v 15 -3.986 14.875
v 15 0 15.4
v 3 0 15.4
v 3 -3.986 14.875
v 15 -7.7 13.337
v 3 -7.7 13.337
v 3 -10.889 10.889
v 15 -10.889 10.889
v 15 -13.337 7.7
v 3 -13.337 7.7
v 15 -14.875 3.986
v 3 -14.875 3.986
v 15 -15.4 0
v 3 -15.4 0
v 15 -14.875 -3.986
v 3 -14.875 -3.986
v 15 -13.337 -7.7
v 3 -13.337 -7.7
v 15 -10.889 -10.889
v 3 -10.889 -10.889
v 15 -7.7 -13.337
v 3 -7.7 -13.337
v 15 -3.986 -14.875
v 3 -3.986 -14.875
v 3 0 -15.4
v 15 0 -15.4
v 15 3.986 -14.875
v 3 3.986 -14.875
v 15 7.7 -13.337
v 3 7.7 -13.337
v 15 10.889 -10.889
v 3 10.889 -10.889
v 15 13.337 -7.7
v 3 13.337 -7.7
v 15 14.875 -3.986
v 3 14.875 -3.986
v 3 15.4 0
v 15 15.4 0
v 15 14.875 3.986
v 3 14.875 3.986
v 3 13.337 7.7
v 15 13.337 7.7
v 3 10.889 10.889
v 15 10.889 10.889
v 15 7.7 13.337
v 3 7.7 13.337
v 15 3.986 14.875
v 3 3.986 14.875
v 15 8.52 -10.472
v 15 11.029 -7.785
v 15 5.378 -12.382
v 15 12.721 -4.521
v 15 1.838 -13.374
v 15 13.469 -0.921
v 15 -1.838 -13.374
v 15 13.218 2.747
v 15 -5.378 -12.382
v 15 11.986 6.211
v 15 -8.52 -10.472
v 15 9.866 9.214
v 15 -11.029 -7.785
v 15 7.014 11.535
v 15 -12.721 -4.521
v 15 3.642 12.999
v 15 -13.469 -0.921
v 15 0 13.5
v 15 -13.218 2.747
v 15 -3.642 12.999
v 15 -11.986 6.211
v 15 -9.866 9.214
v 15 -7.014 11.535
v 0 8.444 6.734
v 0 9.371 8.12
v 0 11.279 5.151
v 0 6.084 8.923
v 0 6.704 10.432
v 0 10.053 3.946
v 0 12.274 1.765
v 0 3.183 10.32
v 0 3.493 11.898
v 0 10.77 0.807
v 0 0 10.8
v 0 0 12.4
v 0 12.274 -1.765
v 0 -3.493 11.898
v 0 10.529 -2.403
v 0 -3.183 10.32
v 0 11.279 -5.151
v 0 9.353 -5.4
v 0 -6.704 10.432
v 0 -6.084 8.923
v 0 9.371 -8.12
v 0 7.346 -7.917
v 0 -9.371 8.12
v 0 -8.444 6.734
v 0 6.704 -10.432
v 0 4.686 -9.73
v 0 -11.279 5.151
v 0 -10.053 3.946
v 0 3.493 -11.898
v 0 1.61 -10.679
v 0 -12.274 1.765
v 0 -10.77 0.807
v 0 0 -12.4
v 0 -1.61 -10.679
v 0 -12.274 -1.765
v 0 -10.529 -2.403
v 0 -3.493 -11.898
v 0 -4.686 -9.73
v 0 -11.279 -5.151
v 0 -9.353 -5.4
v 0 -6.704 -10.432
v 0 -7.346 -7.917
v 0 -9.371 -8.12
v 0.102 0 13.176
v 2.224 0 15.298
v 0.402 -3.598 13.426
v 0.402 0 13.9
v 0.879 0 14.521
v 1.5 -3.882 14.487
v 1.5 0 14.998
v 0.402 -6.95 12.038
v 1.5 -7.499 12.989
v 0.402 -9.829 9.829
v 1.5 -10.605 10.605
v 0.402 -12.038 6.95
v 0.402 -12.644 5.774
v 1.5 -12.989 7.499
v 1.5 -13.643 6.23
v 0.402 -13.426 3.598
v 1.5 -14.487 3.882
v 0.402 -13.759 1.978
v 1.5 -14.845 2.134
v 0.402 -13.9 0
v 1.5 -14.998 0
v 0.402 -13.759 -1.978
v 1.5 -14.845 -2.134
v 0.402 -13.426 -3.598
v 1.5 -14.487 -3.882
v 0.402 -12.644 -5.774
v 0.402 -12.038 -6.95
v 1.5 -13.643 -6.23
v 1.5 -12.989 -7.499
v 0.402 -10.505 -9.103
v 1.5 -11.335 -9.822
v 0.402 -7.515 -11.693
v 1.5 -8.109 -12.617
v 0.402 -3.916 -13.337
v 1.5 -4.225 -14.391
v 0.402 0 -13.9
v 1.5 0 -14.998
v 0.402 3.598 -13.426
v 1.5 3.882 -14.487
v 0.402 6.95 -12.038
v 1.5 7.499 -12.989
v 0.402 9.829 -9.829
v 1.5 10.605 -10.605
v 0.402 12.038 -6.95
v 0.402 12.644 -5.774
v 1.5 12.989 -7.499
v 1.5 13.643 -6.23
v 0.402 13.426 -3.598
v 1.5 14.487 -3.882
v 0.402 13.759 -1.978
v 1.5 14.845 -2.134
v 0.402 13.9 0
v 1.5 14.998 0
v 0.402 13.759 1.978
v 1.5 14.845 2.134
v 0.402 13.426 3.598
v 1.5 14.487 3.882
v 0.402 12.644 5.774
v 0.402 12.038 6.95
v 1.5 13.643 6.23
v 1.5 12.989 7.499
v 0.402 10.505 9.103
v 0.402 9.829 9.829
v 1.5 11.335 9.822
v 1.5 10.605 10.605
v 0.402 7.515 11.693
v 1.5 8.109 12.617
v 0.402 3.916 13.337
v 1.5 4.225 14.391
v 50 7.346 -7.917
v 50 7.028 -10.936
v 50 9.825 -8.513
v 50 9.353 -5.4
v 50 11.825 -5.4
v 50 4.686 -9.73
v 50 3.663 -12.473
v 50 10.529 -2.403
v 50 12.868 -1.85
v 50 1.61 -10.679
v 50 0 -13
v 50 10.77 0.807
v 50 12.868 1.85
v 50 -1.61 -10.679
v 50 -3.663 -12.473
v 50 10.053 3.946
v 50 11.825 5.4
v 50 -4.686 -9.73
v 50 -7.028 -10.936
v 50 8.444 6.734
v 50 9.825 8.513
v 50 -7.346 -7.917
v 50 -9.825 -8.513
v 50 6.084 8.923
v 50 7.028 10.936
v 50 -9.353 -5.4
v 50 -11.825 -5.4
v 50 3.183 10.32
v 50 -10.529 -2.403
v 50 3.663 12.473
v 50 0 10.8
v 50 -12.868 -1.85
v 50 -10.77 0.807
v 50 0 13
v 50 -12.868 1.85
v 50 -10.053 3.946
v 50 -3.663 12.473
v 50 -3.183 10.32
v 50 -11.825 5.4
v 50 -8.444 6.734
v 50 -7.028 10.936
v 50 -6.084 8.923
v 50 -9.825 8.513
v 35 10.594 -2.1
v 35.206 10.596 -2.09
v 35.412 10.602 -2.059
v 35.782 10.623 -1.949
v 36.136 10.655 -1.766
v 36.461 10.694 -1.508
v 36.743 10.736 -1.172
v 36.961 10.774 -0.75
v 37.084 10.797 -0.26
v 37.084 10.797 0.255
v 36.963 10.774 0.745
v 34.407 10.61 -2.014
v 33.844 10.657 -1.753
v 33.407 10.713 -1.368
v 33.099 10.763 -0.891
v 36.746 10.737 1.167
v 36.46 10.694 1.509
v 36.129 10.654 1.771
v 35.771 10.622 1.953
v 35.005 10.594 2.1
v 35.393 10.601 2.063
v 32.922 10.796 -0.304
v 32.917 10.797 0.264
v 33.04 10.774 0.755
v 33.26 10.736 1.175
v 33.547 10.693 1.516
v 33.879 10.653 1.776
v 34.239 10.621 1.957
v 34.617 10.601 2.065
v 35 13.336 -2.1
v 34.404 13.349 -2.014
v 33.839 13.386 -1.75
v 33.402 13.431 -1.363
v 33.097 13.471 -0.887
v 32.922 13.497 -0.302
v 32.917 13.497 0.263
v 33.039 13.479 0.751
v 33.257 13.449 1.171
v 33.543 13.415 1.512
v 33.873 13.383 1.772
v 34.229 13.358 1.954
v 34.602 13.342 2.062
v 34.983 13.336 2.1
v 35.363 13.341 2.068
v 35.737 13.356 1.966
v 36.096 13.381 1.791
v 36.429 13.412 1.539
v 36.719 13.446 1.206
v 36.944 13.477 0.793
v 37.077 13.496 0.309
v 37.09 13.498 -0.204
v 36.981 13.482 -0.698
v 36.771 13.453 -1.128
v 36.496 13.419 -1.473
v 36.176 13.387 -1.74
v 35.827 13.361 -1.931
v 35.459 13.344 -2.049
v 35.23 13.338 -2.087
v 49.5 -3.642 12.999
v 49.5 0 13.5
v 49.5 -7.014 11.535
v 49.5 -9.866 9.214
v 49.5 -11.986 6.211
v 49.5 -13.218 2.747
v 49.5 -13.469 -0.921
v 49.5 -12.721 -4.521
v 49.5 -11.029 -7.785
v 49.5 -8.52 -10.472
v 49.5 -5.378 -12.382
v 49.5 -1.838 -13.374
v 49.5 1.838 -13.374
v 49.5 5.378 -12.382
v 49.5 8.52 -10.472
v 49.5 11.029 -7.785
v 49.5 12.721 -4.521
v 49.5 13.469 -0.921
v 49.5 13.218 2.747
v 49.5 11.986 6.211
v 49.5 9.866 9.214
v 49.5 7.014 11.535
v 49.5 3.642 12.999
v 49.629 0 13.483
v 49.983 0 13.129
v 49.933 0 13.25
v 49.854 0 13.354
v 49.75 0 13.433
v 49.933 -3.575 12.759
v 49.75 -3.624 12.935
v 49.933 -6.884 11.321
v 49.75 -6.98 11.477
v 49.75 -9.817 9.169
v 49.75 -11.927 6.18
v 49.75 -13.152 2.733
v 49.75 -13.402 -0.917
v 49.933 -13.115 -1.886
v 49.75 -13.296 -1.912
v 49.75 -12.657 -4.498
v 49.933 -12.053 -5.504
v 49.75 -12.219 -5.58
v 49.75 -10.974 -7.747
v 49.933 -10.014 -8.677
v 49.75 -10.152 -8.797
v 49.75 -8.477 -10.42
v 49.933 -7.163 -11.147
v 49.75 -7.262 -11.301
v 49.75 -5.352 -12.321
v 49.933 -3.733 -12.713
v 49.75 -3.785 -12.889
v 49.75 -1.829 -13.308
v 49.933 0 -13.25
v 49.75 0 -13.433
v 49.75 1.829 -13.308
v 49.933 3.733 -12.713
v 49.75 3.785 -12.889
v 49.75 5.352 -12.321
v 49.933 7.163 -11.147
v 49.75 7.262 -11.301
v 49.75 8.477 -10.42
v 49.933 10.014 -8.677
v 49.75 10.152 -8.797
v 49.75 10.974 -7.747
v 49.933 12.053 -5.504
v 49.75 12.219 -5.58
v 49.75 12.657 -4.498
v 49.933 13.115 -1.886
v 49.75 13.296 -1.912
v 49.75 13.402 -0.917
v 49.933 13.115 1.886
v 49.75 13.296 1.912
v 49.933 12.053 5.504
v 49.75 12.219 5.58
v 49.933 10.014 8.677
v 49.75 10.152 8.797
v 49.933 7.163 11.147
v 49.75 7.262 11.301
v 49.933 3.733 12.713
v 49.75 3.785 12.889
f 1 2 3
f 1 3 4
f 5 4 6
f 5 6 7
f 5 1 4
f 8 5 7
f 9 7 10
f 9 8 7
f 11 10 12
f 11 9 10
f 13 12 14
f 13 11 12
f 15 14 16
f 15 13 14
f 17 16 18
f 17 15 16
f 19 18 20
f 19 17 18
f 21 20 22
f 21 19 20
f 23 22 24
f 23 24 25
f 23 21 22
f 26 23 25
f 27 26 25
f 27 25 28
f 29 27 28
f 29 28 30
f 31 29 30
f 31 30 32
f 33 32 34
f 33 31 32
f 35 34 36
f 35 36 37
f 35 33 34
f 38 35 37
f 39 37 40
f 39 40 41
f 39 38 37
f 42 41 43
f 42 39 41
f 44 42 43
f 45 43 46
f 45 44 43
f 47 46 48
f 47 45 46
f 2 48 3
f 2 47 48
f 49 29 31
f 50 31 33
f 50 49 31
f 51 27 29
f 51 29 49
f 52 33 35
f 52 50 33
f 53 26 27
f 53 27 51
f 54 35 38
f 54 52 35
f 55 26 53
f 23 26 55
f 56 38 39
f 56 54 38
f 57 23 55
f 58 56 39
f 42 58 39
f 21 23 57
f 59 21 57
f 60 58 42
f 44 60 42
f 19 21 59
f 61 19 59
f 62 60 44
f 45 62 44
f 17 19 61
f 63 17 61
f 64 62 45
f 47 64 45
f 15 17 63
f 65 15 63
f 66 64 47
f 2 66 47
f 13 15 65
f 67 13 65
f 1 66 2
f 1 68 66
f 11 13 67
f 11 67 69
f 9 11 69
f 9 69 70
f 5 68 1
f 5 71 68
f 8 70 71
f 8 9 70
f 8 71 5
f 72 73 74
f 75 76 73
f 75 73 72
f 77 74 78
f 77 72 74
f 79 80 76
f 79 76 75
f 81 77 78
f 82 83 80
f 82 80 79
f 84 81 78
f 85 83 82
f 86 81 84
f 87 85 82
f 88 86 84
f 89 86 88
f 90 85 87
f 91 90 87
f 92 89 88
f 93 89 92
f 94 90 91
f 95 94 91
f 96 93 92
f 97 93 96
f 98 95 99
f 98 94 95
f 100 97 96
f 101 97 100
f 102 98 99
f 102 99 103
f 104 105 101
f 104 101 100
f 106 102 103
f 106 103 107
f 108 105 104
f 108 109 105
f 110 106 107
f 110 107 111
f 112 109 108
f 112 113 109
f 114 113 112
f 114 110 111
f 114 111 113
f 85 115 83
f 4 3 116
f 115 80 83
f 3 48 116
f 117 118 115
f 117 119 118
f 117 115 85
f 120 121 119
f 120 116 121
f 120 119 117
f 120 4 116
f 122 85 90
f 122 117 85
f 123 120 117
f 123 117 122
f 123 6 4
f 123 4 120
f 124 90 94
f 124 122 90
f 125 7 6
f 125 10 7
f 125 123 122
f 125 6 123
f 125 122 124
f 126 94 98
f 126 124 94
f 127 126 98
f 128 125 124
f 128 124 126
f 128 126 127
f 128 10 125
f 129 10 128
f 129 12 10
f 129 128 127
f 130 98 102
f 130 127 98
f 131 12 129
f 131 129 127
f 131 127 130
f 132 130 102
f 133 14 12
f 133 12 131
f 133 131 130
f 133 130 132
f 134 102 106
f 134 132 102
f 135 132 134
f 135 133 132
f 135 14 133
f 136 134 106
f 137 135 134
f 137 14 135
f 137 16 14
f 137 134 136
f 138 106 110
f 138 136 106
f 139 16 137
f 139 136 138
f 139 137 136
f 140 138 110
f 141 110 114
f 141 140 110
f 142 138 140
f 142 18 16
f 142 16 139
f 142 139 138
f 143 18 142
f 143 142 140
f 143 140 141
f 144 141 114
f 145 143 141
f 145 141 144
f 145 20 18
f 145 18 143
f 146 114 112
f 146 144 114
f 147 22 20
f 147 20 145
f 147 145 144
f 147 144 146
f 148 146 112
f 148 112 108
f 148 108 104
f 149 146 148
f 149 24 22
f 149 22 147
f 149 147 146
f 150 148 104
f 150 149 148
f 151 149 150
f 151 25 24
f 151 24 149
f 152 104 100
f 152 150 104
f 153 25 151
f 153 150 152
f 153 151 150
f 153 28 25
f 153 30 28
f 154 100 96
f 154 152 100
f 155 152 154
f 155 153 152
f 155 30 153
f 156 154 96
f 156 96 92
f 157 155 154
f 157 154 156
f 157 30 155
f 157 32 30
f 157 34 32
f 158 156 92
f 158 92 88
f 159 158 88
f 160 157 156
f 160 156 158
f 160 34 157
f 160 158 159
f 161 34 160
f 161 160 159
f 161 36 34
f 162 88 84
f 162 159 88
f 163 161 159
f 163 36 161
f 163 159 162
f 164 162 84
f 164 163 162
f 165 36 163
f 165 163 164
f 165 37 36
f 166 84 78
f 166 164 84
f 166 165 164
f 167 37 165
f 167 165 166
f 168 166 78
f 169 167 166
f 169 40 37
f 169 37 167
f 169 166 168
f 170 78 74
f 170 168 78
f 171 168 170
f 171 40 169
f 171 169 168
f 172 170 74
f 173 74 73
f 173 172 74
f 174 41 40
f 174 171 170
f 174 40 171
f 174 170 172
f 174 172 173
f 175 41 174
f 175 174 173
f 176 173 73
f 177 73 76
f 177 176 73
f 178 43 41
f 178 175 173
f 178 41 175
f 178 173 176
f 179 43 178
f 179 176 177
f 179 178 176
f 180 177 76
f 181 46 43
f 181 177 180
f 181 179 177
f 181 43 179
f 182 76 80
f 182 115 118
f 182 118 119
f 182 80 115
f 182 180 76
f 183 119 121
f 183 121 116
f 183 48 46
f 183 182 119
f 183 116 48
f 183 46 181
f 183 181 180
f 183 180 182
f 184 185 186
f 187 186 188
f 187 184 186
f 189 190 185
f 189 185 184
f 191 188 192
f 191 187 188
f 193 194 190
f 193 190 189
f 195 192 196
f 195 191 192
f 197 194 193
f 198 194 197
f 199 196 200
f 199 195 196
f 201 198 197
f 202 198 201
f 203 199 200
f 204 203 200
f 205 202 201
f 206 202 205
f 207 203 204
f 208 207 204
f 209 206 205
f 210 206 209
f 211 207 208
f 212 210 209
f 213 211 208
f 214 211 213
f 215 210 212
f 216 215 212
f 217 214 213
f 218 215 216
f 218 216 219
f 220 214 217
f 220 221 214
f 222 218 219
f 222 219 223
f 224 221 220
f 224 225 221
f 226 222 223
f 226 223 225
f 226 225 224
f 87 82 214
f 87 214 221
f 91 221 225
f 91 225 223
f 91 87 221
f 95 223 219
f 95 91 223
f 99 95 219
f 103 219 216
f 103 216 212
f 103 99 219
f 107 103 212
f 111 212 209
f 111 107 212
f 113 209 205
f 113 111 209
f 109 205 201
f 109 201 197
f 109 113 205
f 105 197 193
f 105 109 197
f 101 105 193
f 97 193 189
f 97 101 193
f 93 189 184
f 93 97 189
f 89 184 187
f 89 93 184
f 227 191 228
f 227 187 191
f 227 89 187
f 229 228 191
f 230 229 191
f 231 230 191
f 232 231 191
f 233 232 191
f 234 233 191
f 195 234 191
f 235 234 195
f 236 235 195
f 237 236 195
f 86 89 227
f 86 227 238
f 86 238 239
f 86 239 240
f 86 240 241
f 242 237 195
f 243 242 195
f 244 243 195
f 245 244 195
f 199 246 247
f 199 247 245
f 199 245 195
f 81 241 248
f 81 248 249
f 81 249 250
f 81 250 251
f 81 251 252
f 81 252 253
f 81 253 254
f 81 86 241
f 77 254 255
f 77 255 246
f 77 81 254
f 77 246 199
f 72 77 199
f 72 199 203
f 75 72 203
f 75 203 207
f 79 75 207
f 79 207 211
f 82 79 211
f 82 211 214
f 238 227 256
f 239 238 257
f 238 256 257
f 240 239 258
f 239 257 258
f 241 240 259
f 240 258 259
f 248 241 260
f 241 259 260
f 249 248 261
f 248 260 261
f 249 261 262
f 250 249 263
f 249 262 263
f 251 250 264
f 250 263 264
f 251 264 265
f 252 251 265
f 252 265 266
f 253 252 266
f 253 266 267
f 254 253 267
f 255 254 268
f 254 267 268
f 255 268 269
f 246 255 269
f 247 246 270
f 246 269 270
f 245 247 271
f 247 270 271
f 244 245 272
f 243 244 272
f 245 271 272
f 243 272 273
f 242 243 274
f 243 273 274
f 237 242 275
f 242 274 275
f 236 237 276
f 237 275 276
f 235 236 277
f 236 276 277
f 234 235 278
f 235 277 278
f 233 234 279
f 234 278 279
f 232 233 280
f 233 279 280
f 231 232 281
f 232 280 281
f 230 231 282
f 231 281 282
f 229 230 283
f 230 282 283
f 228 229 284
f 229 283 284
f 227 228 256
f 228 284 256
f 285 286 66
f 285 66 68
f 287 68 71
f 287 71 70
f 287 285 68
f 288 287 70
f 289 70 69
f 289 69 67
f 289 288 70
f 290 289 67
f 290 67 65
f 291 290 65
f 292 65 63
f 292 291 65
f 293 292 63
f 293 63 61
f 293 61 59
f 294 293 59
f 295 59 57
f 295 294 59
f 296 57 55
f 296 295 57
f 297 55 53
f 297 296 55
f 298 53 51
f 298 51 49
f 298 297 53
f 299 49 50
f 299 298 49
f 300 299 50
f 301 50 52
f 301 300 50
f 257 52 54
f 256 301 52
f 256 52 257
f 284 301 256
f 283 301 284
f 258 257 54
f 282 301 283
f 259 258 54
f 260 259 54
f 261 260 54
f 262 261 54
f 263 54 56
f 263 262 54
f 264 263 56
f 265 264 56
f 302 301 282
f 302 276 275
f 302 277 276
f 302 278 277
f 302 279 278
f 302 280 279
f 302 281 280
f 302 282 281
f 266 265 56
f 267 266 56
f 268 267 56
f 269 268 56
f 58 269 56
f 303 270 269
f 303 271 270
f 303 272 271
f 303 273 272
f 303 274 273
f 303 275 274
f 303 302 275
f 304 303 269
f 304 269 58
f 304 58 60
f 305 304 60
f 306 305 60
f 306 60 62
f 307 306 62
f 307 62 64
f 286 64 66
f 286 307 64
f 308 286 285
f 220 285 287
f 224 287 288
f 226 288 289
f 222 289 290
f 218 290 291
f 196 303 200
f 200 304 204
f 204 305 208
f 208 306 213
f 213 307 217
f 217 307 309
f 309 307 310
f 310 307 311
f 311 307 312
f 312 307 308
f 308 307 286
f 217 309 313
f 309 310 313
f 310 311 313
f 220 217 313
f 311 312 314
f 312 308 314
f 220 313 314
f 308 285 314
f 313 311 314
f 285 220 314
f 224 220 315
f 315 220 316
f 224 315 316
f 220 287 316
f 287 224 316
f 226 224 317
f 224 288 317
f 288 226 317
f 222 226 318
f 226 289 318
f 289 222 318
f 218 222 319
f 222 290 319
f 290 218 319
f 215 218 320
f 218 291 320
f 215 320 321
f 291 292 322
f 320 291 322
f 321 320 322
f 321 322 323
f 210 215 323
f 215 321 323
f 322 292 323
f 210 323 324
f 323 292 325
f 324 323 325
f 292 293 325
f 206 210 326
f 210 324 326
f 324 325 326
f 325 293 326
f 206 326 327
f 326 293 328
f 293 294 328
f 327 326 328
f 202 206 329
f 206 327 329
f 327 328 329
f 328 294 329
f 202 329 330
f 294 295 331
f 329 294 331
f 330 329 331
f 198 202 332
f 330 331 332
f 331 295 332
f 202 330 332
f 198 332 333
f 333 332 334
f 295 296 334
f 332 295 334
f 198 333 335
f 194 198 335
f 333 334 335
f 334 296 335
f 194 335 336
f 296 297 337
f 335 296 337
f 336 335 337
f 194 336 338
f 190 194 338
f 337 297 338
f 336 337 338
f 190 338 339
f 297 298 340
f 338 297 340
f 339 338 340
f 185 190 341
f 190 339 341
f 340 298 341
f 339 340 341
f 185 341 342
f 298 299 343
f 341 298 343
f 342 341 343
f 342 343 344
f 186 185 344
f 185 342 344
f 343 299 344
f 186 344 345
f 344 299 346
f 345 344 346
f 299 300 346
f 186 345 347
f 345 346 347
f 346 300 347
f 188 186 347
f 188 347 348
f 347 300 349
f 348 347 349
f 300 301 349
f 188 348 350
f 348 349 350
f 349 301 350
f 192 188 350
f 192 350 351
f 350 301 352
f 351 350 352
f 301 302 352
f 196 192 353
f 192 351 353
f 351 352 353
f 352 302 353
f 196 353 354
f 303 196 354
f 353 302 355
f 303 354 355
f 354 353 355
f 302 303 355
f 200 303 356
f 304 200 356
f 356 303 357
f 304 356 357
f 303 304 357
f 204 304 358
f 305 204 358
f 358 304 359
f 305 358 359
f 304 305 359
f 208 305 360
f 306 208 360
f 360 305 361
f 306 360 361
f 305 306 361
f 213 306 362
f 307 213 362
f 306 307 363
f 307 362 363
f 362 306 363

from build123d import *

# Parameters (mm, degrees)
ESBO_O3_W = 2.1
ESBO_O3_H = 15.4
FILETE1_R = 3
FILETE2_R = 0.5


with BuildPart() as part:
    # Esboço1 → Revolução1 (revolve)
    with BuildSketch(Plane.XY, mode=Mode.PRIVATE) as revolu_o1_sk:
        Polygon((0, 10.8), (0, 15.4), (15, 15.4), (15, 13.5), (50, 13.5), (50, 10.8), align=None)
    revolve(revolu_o1_sk.sketch.rotate(Axis((0, 0, 0), (1, 0, 0)), 90), axis=Axis((0, 0, 0), (1, 0, 0)))

    # Esboço3 → Furo roscado de M51 (revolve, cut)
    with BuildSketch(Plane(origin=(35, 0, 0), x_dir=(0, 0, -1), z_dir=(1, 0, 0))):
        with Locations((1.05, 7.7)):
            Rectangle(ESBO_O3_W, ESBO_O3_H)
    revolve(axis=Axis((35, -6.35, 0), (0, 1, 0)), mode=Mode.SUBTRACT)

    # Filete1
    filete1_edges = [part.edges().sort_by_distance(p)[0] for p in [
        (0, 0, -15.4),
    ]]
    fillet(filete1_edges, radius=FILETE1_R)

    # Filete2
    filete2_edges = [part.edges().sort_by_distance(p)[0] for p in [
        (50, 0, -13.5),
    ]]
    fillet(filete2_edges, radius=FILETE2_R)


solid = part.part
